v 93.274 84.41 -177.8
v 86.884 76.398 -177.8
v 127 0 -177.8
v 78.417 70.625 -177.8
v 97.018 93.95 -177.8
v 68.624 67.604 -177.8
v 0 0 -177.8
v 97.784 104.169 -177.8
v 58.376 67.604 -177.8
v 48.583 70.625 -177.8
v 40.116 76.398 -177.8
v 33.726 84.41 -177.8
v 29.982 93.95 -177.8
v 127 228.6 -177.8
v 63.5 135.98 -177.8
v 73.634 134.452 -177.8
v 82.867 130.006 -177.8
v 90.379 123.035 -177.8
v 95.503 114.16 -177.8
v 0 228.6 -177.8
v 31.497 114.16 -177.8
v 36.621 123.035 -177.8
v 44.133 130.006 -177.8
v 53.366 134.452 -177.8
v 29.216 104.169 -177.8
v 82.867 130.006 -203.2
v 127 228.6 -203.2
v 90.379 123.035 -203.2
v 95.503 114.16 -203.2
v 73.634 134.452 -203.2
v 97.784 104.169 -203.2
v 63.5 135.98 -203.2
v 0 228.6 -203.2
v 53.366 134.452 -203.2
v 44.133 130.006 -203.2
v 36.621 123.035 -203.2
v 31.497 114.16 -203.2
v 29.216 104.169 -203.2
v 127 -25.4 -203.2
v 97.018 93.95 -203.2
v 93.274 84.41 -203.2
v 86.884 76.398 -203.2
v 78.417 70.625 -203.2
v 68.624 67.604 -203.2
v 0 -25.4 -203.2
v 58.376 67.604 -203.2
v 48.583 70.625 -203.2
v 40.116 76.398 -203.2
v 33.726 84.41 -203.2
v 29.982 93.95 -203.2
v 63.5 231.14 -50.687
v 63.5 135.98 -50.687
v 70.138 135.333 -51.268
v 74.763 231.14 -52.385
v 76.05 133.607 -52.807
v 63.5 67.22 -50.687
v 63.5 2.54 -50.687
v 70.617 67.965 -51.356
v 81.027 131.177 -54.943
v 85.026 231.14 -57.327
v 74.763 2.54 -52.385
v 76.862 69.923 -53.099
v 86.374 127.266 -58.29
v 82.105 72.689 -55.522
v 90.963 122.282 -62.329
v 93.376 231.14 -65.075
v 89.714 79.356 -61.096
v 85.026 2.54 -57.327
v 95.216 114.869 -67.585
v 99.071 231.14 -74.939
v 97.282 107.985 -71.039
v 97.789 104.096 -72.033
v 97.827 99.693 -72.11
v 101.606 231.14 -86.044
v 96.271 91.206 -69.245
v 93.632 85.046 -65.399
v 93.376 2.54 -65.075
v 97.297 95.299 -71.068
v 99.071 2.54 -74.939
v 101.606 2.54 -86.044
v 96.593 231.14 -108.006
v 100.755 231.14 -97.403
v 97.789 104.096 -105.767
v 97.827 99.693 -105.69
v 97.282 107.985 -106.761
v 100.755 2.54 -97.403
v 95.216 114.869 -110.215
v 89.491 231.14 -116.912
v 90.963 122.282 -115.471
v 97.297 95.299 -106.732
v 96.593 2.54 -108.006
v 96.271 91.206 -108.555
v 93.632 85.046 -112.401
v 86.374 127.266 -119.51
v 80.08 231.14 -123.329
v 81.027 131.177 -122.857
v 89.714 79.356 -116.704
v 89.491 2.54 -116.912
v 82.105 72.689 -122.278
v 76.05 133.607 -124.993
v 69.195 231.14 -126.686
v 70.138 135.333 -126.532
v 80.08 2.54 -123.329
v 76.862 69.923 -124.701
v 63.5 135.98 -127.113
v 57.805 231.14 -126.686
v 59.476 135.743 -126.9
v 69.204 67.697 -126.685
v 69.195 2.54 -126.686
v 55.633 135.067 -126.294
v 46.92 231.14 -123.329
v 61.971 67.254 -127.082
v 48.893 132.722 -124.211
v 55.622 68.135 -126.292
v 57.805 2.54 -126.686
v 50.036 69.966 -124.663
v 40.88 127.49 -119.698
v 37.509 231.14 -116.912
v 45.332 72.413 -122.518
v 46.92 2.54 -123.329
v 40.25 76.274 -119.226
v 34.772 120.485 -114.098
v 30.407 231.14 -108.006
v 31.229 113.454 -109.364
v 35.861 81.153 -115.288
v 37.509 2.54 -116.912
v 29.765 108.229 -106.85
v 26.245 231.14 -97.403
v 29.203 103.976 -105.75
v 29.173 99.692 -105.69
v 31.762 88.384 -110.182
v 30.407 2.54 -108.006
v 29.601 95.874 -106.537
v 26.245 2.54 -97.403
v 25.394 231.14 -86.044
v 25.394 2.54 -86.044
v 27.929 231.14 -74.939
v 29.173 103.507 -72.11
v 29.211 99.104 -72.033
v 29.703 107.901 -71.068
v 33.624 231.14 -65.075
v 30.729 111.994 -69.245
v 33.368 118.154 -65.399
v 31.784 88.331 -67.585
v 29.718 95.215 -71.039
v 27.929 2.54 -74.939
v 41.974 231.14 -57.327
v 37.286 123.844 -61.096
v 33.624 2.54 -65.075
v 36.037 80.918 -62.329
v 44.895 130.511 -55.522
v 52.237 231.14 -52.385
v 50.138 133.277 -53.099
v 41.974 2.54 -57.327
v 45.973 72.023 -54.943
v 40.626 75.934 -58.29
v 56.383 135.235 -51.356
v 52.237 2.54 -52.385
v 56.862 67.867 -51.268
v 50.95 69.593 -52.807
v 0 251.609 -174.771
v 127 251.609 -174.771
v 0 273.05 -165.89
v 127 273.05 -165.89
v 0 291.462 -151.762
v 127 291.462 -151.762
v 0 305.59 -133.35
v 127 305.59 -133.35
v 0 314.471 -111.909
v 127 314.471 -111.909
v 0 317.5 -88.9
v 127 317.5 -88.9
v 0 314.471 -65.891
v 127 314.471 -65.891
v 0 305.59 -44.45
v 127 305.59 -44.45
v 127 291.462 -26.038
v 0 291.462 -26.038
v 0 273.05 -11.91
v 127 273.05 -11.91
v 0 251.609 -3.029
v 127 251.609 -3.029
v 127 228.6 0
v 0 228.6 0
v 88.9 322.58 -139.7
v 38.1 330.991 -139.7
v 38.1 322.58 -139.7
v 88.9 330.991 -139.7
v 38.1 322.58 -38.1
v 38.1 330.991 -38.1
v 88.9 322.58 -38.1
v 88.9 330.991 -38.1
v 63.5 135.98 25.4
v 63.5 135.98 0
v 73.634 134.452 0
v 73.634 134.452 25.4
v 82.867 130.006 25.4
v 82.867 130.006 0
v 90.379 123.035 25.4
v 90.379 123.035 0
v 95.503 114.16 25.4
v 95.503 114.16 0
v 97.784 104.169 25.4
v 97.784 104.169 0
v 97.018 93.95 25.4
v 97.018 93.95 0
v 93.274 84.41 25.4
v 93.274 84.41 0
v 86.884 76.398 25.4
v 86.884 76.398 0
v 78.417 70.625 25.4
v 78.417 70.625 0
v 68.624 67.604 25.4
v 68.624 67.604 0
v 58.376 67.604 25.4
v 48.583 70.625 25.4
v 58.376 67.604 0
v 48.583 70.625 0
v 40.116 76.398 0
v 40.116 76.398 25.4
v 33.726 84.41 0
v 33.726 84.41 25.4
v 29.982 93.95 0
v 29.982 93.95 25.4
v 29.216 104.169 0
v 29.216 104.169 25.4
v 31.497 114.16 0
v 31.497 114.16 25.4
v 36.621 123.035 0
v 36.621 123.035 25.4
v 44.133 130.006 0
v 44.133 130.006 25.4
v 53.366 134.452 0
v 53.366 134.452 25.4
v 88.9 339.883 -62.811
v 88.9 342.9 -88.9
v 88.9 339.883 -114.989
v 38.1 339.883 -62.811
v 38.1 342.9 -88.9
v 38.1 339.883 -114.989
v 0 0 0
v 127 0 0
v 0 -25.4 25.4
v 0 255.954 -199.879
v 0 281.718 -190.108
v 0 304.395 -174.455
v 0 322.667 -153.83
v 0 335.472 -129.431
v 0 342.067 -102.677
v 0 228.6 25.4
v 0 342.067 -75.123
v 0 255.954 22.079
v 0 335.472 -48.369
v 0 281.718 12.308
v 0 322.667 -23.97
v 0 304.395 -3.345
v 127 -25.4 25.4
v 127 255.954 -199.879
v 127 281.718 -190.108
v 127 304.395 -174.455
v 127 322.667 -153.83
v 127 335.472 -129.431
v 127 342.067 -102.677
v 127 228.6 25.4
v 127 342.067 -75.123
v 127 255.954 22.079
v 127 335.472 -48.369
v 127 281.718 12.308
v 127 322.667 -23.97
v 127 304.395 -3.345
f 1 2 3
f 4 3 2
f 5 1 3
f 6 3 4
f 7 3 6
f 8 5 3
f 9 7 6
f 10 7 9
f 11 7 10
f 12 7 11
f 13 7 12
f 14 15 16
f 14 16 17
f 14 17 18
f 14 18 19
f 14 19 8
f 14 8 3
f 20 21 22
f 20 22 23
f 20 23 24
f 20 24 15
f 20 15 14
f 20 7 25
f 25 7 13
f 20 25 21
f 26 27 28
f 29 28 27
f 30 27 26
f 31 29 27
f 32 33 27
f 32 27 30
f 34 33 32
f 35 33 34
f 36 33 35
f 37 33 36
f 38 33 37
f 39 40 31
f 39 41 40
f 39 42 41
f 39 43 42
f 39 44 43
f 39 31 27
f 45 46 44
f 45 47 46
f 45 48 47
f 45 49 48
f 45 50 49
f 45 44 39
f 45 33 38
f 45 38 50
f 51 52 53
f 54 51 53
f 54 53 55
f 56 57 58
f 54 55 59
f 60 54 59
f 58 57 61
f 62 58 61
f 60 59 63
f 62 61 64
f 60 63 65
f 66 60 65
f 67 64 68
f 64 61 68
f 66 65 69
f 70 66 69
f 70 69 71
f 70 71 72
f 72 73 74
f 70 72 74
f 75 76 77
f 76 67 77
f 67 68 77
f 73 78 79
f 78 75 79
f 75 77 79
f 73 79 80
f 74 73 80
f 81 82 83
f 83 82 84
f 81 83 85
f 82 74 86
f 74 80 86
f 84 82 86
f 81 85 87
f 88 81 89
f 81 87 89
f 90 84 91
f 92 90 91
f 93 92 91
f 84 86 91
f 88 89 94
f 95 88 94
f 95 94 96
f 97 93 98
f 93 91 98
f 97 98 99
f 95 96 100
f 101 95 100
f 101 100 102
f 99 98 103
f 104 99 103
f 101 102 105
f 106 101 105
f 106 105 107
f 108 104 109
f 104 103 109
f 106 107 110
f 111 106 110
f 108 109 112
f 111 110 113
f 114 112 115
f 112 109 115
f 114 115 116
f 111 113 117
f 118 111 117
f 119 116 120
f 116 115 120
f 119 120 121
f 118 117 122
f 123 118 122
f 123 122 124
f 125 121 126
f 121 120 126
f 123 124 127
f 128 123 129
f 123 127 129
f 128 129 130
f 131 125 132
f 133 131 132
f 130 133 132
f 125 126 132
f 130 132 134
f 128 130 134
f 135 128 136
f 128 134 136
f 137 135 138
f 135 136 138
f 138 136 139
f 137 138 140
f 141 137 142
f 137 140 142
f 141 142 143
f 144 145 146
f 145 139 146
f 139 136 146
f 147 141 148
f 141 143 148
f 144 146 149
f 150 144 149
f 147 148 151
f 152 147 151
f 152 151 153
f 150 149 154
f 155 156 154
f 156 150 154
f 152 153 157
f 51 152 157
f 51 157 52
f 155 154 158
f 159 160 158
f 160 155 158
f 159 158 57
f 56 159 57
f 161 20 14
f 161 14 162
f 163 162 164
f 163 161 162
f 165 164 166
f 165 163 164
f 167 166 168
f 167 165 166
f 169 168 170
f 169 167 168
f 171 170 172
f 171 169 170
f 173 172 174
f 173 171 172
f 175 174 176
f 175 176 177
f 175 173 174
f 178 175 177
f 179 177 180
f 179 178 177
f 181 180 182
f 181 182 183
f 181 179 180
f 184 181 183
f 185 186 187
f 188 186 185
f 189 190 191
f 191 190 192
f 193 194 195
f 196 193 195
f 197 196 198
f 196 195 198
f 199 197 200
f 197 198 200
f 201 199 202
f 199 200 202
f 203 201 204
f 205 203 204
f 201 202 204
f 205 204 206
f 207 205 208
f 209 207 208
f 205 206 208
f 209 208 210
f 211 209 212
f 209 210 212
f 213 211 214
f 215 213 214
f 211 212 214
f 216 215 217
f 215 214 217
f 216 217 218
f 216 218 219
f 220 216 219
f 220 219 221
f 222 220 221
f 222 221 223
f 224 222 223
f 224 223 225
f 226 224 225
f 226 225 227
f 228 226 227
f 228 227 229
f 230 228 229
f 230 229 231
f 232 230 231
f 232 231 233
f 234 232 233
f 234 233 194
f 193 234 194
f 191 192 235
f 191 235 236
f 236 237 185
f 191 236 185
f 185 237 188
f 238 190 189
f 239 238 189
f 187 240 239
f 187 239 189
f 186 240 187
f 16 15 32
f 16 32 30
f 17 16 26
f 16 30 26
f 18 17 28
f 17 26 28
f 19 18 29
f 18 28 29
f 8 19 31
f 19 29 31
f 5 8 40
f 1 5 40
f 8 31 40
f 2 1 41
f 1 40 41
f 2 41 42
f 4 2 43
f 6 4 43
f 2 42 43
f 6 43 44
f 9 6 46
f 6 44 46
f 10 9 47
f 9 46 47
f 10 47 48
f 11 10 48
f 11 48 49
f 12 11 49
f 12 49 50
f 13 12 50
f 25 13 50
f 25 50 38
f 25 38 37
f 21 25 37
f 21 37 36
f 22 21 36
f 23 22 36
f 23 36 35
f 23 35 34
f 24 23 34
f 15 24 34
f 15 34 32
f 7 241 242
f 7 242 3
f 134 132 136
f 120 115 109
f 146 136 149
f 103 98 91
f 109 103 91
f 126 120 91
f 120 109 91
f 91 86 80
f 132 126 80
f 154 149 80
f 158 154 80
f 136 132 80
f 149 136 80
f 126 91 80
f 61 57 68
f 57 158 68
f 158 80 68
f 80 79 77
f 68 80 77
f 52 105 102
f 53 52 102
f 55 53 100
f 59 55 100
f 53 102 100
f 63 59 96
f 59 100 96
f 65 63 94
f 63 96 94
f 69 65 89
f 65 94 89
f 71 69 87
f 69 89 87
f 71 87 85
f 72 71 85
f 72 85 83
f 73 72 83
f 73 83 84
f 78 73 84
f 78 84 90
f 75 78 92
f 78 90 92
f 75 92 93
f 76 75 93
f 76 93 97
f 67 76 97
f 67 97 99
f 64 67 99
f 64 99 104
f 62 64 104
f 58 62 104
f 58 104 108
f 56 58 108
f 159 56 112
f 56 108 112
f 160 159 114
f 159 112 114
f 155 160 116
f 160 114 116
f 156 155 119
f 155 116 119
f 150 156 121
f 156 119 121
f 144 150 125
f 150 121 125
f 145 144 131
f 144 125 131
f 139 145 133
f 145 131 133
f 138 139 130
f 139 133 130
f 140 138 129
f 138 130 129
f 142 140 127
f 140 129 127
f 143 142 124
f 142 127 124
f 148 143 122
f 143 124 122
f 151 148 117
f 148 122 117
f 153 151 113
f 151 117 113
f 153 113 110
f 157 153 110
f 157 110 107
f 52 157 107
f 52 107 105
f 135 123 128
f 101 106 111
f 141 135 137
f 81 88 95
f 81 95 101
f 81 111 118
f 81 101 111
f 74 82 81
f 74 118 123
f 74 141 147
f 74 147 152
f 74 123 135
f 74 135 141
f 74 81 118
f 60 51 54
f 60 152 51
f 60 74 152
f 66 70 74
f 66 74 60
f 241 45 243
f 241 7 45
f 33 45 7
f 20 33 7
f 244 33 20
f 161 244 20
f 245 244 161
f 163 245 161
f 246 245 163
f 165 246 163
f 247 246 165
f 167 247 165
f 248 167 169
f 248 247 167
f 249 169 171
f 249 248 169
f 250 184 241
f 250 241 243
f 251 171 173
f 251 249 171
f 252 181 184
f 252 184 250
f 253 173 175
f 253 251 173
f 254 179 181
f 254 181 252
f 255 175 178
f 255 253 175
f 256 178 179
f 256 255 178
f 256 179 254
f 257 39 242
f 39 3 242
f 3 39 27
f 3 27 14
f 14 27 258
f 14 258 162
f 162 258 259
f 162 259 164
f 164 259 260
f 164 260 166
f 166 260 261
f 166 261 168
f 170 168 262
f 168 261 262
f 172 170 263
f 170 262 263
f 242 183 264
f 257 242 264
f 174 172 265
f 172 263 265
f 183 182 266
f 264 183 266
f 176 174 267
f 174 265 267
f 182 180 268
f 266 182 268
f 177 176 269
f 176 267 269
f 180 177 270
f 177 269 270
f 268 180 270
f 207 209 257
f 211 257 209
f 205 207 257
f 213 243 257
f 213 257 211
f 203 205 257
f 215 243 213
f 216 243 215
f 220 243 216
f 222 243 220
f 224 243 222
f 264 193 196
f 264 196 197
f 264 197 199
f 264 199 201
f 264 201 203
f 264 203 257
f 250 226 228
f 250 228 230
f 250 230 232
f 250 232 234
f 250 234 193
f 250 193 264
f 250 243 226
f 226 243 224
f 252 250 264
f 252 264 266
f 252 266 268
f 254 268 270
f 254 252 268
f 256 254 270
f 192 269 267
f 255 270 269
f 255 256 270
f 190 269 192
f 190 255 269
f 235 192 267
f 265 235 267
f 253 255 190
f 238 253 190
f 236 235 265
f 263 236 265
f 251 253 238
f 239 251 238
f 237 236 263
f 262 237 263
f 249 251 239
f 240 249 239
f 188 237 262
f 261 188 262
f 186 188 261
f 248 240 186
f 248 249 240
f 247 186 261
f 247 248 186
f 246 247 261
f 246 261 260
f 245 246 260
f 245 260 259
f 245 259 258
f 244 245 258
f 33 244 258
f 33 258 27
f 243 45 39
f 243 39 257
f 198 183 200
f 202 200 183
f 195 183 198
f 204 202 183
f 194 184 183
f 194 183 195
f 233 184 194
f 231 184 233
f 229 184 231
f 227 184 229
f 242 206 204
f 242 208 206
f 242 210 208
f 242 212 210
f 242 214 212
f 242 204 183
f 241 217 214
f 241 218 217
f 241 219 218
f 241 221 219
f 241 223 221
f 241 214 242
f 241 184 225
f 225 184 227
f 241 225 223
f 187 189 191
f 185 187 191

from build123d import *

# Parameters (mm, degrees)
BOSS_EXTRUDE2_DEPTH = 127
SKETCH2_W           = 50.8
SKETCH2_H           = 101.6
CUT_EXTRUDE1_DEPTH  = 20.32
SKETCH4_R           = 38.212912671
BOSS_EXTRUDE3_DEPTH = 228.6
SKETCH5_R           = 34.379676842
CUT_EXTRUDE2_DEPTH  = 433.591157561


with BuildPart() as part:
    # Sketch1 → Boss-Extrude2 (new body)
    with BuildSketch(Plane(origin=(0, 0, 0), x_dir=(0, 0, -1), z_dir=(1, 0, 0))):
        with BuildLine():
            Line((-25.4, -25.4), (-25.4, 228.6))
            ThreePointArc((-25.4, 228.6), (88.9, 342.9), (203.2, 228.6))
            Line((203.2, 228.6), (203.2, -25.4))
            Line((203.2, -25.4), (-25.4, -25.4))
        make_face()
        with BuildLine():
            Line((0, 0), (177.8, 0))
            Line((177.8, 0), (177.8, 228.6))
            ThreePointArc((177.8, 228.6), (88.9, 317.5), (0, 228.6))
            Line((0, 228.6), (0, 0))
        make_face(mode=Mode.SUBTRACT)
    extrude(amount=BOSS_EXTRUDE2_DEPTH)

    # Sketch2 → Cut-Extrude1 (cut)
    with BuildSketch(Plane(origin=(0, 342.9, 0), x_dir=(1, 0, 0), z_dir=(0, 1, 0))):
        with Locations((63.5, 88.9)):
            Rectangle(SKETCH2_W, SKETCH2_H)
    extrude(amount=-CUT_EXTRUDE1_DEPTH, mode=Mode.SUBTRACT)


with BuildPart() as body_2:
    # Sketch4 → Boss-Extrude3 (new body)
    with BuildSketch(Plane(origin=(0, 2.54, 0), x_dir=(1, 0, 0), z_dir=(0, 1, 0))):
        with Locations(Location((63.5, 88.9, 0), (0, 0, 270))):
            Circle(SKETCH4_R)
    extrude(amount=BOSS_EXTRUDE3_DEPTH)


with BuildPart() as cut_extrude2_tool:
    # Sketch5 → Cut-Extrude2 (new, through all)
    with BuildSketch(Plane(origin=(0, 0, -205.74), x_dir=(-1, 0, 0), z_dir=(0, 0, -1))):
        with Locations(Location((-63.5, 101.6, 0), (0, 0, 90.000000002))):
            Circle(SKETCH5_R)
    extrude(amount=-CUT_EXTRUDE2_DEPTH)


with BuildPart() as part_1:
    add(part.part)

    # Cut-Extrude2: cut by cut_extrude2_tool
    add(cut_extrude2_tool.part, mode=Mode.SUBTRACT)


with BuildPart() as body_2_1:
    add(body_2.part)

    # Cut-Extrude2: cut by cut_extrude2_tool
    add(cut_extrude2_tool.part, mode=Mode.SUBTRACT)


solid = Compound([part_1.part, body_2_1.part])
